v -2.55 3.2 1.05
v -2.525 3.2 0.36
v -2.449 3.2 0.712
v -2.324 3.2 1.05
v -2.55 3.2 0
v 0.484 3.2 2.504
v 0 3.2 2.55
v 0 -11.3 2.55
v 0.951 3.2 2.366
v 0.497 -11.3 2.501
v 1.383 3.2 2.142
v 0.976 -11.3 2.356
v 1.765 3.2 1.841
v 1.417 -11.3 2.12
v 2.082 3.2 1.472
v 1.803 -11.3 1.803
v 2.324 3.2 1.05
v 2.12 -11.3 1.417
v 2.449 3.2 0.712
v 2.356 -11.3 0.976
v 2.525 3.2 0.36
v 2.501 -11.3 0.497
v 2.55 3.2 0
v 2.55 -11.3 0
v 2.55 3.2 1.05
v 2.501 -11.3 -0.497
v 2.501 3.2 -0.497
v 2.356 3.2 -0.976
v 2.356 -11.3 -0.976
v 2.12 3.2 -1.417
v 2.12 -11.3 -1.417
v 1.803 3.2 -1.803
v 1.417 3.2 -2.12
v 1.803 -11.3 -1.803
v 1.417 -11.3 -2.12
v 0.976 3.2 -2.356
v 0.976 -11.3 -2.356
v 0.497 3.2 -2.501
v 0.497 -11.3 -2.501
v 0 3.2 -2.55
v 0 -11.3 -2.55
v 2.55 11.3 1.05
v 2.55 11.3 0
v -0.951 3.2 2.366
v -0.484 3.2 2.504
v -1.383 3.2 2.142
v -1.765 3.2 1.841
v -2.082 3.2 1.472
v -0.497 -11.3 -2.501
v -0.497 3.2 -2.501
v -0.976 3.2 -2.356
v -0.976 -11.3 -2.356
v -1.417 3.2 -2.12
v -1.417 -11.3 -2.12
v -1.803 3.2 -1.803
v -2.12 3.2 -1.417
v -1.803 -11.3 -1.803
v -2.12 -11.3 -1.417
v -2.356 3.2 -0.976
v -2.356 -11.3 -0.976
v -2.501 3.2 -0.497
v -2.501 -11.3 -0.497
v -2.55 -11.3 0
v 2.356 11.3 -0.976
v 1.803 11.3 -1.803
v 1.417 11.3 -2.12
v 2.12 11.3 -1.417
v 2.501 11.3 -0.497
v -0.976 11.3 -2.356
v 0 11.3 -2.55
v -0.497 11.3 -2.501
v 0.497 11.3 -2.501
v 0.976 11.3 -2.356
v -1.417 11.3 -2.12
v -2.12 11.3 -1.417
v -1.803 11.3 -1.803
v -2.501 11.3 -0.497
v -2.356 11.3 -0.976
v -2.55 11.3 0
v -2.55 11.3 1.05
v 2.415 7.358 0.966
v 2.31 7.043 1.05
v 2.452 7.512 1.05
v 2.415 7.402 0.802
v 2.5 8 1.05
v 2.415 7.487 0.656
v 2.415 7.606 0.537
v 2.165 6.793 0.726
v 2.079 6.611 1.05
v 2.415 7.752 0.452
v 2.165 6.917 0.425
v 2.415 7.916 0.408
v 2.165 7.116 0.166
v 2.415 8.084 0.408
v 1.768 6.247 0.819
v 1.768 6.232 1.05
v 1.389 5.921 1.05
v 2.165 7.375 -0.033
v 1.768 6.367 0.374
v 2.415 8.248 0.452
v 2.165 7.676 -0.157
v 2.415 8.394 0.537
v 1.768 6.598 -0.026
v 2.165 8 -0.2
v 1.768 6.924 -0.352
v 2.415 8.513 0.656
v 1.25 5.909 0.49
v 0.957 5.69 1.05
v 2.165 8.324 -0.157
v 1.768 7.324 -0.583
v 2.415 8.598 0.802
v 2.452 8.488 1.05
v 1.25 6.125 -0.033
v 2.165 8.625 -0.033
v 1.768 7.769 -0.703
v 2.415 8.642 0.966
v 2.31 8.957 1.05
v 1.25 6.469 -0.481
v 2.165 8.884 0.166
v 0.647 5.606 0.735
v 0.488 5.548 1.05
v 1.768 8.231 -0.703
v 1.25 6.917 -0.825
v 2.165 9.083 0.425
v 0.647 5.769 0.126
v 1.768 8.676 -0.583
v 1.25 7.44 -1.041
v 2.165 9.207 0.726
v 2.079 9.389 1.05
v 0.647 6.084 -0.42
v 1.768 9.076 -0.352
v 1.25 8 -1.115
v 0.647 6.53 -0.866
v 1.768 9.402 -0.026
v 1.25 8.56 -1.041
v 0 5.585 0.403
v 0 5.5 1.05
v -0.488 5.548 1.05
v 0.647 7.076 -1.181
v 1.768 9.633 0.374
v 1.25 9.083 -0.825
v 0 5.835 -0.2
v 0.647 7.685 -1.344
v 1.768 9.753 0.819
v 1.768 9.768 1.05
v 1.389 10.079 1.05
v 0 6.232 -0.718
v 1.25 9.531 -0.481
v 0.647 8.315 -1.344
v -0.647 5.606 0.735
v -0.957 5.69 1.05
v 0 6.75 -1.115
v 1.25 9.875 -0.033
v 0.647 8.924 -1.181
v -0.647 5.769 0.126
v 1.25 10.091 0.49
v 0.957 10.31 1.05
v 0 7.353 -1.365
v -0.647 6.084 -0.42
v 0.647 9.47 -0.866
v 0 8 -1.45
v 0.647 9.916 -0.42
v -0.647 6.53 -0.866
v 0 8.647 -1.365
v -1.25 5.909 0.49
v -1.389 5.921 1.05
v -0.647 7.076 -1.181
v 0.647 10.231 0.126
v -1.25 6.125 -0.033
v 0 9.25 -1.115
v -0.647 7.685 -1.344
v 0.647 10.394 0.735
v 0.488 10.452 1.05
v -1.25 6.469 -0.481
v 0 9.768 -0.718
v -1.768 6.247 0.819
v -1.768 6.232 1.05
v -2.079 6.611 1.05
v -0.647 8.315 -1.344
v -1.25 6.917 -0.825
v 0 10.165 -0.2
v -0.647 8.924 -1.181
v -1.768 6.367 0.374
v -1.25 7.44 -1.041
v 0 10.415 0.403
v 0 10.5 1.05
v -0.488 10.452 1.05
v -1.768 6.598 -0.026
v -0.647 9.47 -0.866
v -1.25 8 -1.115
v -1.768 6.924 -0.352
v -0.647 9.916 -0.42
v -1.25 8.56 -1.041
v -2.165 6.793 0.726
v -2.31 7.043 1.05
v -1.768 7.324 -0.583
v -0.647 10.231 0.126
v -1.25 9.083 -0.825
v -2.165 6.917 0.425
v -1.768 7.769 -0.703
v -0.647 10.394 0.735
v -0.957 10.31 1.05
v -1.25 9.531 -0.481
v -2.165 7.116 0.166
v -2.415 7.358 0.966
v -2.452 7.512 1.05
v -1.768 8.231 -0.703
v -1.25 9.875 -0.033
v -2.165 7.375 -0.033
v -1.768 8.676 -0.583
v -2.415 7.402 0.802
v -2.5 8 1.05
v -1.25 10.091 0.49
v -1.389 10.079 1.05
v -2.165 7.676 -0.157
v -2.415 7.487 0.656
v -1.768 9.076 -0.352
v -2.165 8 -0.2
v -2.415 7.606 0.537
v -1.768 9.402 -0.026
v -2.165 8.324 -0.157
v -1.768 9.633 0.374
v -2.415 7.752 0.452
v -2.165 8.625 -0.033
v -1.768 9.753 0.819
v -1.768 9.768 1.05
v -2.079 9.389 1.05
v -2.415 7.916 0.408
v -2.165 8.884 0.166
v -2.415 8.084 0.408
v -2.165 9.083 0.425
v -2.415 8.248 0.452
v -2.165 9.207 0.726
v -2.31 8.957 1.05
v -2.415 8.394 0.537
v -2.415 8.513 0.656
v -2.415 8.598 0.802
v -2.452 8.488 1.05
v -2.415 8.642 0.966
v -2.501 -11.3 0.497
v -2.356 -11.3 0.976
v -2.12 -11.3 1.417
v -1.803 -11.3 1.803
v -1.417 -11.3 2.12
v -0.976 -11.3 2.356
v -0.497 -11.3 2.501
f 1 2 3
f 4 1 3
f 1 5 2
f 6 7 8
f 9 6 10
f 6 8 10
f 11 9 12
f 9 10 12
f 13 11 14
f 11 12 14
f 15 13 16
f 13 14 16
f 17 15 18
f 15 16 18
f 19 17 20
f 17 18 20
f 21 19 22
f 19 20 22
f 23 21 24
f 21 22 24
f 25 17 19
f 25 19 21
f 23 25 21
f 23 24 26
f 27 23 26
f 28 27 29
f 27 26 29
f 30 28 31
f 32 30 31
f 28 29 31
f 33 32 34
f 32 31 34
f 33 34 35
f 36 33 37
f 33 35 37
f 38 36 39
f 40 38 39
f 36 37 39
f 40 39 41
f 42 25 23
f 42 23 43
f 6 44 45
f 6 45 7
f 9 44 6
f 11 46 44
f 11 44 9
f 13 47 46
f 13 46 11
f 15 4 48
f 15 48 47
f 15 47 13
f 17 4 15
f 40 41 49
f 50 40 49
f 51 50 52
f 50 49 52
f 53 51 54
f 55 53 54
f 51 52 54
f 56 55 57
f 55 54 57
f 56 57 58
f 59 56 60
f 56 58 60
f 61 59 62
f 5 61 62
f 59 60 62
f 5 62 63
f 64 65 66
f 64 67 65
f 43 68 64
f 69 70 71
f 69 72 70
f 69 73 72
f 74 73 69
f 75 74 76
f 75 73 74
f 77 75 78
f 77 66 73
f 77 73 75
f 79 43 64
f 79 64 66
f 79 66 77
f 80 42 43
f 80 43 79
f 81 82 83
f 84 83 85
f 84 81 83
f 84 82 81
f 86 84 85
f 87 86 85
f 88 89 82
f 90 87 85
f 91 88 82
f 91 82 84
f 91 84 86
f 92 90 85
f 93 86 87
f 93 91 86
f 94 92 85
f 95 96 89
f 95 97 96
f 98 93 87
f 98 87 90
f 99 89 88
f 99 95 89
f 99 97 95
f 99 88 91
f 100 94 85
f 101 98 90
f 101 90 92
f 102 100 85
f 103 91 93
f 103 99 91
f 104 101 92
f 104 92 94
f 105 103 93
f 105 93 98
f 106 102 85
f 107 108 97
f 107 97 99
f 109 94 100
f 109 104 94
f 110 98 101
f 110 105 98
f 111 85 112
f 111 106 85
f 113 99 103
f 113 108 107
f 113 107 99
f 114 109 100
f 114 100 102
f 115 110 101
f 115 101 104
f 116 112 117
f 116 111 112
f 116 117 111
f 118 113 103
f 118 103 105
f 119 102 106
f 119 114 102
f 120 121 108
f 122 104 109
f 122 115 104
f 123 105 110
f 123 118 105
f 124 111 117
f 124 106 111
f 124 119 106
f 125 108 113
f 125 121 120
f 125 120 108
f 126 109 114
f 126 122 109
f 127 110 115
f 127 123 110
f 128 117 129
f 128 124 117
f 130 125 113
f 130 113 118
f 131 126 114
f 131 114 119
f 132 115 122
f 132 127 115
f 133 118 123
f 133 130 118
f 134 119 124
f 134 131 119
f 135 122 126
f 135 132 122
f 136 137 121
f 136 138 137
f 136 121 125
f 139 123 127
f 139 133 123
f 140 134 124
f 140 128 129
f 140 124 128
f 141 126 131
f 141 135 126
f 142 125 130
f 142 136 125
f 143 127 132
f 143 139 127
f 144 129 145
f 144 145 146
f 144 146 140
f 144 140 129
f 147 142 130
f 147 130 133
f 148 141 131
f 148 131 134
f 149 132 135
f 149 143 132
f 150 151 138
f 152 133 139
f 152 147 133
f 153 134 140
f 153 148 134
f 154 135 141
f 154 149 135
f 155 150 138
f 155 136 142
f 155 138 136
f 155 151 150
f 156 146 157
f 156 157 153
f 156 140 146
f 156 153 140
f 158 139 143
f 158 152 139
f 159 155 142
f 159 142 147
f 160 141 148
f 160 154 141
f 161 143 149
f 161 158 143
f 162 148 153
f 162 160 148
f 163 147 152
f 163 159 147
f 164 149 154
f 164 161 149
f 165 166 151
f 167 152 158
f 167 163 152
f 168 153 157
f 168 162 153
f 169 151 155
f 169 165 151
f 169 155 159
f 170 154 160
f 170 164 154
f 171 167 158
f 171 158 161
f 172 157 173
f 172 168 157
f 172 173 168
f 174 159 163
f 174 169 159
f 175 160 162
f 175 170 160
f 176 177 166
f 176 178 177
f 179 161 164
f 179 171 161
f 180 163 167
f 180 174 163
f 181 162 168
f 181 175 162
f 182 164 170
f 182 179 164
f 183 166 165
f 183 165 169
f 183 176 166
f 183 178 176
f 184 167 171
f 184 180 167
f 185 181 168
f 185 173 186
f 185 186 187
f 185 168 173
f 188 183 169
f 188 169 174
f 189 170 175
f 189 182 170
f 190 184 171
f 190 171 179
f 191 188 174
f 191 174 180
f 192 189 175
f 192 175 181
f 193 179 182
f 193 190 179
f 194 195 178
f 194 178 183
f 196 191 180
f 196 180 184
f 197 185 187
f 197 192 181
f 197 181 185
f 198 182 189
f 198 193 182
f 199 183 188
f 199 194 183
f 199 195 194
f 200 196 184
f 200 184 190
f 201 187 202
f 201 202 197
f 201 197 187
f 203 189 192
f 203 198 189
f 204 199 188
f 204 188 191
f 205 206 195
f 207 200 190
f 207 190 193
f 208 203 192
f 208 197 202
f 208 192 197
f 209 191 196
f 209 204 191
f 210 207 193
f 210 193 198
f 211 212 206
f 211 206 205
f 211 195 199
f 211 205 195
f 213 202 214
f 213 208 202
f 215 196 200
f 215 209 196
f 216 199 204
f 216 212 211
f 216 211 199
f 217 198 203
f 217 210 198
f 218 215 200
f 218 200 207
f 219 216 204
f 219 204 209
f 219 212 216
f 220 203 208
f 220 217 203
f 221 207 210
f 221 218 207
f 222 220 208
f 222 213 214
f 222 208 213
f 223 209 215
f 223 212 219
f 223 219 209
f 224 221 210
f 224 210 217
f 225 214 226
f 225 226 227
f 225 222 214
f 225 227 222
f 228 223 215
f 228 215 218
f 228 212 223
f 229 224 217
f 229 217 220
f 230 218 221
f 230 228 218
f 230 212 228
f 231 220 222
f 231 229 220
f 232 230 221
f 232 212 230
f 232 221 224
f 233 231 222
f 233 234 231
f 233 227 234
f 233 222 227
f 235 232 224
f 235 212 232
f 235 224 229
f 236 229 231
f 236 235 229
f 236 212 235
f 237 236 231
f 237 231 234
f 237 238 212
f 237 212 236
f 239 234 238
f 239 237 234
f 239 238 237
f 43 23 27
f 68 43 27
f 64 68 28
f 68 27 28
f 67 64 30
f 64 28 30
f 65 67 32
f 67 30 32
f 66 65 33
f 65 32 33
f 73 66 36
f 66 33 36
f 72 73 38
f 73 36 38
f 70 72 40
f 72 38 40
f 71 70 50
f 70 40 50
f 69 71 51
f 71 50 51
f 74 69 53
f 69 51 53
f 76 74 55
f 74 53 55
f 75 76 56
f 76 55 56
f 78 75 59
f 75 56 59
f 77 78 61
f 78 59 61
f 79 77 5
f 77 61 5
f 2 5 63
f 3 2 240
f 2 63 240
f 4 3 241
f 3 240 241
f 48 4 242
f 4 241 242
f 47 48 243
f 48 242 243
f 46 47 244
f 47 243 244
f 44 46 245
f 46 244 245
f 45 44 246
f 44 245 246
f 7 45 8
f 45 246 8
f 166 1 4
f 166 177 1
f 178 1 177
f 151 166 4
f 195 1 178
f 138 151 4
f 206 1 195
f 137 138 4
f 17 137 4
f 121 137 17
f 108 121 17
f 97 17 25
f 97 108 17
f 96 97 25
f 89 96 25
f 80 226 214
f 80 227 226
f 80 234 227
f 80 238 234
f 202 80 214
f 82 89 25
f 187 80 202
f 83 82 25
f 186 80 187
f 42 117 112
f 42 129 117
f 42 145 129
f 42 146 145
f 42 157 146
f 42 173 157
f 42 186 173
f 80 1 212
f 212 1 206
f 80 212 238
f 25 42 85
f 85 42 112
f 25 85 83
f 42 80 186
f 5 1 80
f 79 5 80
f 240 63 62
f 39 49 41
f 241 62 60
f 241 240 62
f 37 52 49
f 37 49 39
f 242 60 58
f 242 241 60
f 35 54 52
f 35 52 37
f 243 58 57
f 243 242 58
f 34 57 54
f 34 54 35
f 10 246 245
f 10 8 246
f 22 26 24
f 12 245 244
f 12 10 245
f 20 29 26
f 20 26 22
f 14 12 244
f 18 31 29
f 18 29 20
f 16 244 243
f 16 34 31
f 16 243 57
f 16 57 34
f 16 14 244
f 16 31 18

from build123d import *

# Parameters (mm, degrees)
SKETCH1_W           = 5.1
SKETCH1_H           = 22.6
BOSS_EXTRUDE1_DEPTH = 2.55
SKETCH3_W           = 5.1
SKETCH3_H           = 8.1
BOSS_EXTRUDE2_DEPTH = 1
CUT_EXTRUDE1_DEPTH  = 14.5
SKETCH5_W           = 5.1
SKETCH5_H           = 1.5
CUT_EXTRUDE2_DEPTH  = 8.1
CUT_EXTRUDE3_DEPTH  = 16.144470938


with BuildPart() as part:
    # Sketch1 → Boss-Extrude1 (new, symmetric)
    with BuildSketch(Plane.XY):
        Rectangle(SKETCH1_W, SKETCH1_H)
    extrude(amount=BOSS_EXTRUDE1_DEPTH, both=True)

    # Sketch3 → Boss-Extrude2 (add)
    with BuildSketch(Plane(origin=(0, 0, -2.55), x_dir=(-1, 0, 0), z_dir=(0, 0, -1))):
        with Locations((0, 7.25)):
            Rectangle(SKETCH3_W, SKETCH3_H)
    extrude(amount=BOSS_EXTRUDE2_DEPTH)

    # Sketch4 → Cut-Extrude1 (cut)
    with BuildSketch(Plane.XZ.offset(11.3)):
        with BuildLine():
            Line((0, 2.55), (-2.55, 2.55))
            Line((-2.55, 2.55), (-2.55, 0))
            ThreePointArc((-2.55, 0), (-1.803122292, 1.803122292), (0, 2.55))
        make_face()
        with BuildLine():
            Line((2.55, 2.55), (0, 2.55))
            ThreePointArc((0, 2.55), (1.803122292, 1.803122292), (2.55, 0))
            Line((2.55, 0), (2.55, 2.55))
        make_face()
        with BuildLine():
            ThreePointArc((2.55, 0), (1.803122292, -1.803122292), (0, -2.55))
            Line((0, -2.55), (2.55, -2.55))
            Line((2.55, -2.55), (2.55, 0))
        make_face()
        with BuildLine():
            ThreePointArc((0, -2.55), (-1.803122292, -1.803122292), (-2.55, 0))
            Line((-2.55, 0), (-2.55, -2.55))
            Line((-2.55, -2.55), (0, -2.55))
        make_face()
    extrude(amount=-CUT_EXTRUDE1_DEPTH, mode=Mode.SUBTRACT)

    # Sketch5 → Cut-Extrude2 (cut)
    with BuildSketch(Plane(origin=(0, 11.3, 0), x_dir=(1, 0, 0), z_dir=(0, 1, 0))):
        with Locations((0, -1.8)):
            Rectangle(SKETCH5_W, SKETCH5_H)
    extrude(amount=-CUT_EXTRUDE2_DEPTH, mode=Mode.SUBTRACT)

    # Sketch6 → Cut-Revolve2 (revolve, cut)
    with BuildSketch(Plane.XY.offset(1.05)):
        with BuildLine():
            Line((-2.5, 8), (2.5, 8))
            ThreePointArc((2.5, 8), (0, 5.5), (-2.5, 8))
        make_face()
    revolve(axis=Axis((-2.5, 8, 1.05), (1, 0, 0)), mode=Mode.SUBTRACT)

    # Sketch7 → Cut-Extrude3 (cut, through all)
    with BuildSketch(Plane.XZ.offset(-3.2)):
        with BuildLine():
            Line((-2.55, -3.55), (2.55, -3.55))
            Line((2.55, -3.55), (2.55, 0))
            ThreePointArc((2.55, 0), (0, -2.55), (-2.55, 0))
            Line((-2.55, 0), (-2.55, -3.55))
        make_face()
    extrude(amount=-CUT_EXTRUDE3_DEPTH, mode=Mode.SUBTRACT)


solid = part.part
